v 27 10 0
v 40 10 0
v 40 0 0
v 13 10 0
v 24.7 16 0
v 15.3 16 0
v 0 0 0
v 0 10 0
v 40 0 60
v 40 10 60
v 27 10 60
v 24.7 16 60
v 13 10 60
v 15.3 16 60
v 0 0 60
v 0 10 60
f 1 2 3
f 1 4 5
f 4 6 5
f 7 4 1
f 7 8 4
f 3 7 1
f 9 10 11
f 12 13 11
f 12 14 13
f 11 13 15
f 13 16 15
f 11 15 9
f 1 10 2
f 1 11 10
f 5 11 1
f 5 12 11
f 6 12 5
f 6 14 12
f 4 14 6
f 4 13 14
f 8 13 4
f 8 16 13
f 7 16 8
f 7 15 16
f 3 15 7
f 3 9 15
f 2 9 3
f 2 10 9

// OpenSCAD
$fn = 32;

// ----------------------------------------------------------------------
// V guide rail: dovetail, 40 mm wide
// ----------------------------------------------------------------------

// --- parameters (mm) ---
rail_w = 40;              // rail width, X
base_t = 10;              // base plate thickness
v_depth = 6;              // V feature depth / height
v_half_w = 7;             // half width of the V at the base face
plate_t = 60;             // rail length, Z (the extrusion height)
top_half_w = 4.7;         // half width at the dovetail top

dovetail_base = 2 * v_half_w;  // dovetail width at the base
dovetail_top = 2 * top_half_w;  // dovetail width at the top

profile = [[0, 0], [40, 0], [40, 10], [27, 10], [24.7, 16], [15.3, 16], [13, 10], [0, 10]];  // primary outline, 8 points, counter clockwise

// --- the one profile operation ---
linear_extrude(height = plate_t) polygon(points = profile);
